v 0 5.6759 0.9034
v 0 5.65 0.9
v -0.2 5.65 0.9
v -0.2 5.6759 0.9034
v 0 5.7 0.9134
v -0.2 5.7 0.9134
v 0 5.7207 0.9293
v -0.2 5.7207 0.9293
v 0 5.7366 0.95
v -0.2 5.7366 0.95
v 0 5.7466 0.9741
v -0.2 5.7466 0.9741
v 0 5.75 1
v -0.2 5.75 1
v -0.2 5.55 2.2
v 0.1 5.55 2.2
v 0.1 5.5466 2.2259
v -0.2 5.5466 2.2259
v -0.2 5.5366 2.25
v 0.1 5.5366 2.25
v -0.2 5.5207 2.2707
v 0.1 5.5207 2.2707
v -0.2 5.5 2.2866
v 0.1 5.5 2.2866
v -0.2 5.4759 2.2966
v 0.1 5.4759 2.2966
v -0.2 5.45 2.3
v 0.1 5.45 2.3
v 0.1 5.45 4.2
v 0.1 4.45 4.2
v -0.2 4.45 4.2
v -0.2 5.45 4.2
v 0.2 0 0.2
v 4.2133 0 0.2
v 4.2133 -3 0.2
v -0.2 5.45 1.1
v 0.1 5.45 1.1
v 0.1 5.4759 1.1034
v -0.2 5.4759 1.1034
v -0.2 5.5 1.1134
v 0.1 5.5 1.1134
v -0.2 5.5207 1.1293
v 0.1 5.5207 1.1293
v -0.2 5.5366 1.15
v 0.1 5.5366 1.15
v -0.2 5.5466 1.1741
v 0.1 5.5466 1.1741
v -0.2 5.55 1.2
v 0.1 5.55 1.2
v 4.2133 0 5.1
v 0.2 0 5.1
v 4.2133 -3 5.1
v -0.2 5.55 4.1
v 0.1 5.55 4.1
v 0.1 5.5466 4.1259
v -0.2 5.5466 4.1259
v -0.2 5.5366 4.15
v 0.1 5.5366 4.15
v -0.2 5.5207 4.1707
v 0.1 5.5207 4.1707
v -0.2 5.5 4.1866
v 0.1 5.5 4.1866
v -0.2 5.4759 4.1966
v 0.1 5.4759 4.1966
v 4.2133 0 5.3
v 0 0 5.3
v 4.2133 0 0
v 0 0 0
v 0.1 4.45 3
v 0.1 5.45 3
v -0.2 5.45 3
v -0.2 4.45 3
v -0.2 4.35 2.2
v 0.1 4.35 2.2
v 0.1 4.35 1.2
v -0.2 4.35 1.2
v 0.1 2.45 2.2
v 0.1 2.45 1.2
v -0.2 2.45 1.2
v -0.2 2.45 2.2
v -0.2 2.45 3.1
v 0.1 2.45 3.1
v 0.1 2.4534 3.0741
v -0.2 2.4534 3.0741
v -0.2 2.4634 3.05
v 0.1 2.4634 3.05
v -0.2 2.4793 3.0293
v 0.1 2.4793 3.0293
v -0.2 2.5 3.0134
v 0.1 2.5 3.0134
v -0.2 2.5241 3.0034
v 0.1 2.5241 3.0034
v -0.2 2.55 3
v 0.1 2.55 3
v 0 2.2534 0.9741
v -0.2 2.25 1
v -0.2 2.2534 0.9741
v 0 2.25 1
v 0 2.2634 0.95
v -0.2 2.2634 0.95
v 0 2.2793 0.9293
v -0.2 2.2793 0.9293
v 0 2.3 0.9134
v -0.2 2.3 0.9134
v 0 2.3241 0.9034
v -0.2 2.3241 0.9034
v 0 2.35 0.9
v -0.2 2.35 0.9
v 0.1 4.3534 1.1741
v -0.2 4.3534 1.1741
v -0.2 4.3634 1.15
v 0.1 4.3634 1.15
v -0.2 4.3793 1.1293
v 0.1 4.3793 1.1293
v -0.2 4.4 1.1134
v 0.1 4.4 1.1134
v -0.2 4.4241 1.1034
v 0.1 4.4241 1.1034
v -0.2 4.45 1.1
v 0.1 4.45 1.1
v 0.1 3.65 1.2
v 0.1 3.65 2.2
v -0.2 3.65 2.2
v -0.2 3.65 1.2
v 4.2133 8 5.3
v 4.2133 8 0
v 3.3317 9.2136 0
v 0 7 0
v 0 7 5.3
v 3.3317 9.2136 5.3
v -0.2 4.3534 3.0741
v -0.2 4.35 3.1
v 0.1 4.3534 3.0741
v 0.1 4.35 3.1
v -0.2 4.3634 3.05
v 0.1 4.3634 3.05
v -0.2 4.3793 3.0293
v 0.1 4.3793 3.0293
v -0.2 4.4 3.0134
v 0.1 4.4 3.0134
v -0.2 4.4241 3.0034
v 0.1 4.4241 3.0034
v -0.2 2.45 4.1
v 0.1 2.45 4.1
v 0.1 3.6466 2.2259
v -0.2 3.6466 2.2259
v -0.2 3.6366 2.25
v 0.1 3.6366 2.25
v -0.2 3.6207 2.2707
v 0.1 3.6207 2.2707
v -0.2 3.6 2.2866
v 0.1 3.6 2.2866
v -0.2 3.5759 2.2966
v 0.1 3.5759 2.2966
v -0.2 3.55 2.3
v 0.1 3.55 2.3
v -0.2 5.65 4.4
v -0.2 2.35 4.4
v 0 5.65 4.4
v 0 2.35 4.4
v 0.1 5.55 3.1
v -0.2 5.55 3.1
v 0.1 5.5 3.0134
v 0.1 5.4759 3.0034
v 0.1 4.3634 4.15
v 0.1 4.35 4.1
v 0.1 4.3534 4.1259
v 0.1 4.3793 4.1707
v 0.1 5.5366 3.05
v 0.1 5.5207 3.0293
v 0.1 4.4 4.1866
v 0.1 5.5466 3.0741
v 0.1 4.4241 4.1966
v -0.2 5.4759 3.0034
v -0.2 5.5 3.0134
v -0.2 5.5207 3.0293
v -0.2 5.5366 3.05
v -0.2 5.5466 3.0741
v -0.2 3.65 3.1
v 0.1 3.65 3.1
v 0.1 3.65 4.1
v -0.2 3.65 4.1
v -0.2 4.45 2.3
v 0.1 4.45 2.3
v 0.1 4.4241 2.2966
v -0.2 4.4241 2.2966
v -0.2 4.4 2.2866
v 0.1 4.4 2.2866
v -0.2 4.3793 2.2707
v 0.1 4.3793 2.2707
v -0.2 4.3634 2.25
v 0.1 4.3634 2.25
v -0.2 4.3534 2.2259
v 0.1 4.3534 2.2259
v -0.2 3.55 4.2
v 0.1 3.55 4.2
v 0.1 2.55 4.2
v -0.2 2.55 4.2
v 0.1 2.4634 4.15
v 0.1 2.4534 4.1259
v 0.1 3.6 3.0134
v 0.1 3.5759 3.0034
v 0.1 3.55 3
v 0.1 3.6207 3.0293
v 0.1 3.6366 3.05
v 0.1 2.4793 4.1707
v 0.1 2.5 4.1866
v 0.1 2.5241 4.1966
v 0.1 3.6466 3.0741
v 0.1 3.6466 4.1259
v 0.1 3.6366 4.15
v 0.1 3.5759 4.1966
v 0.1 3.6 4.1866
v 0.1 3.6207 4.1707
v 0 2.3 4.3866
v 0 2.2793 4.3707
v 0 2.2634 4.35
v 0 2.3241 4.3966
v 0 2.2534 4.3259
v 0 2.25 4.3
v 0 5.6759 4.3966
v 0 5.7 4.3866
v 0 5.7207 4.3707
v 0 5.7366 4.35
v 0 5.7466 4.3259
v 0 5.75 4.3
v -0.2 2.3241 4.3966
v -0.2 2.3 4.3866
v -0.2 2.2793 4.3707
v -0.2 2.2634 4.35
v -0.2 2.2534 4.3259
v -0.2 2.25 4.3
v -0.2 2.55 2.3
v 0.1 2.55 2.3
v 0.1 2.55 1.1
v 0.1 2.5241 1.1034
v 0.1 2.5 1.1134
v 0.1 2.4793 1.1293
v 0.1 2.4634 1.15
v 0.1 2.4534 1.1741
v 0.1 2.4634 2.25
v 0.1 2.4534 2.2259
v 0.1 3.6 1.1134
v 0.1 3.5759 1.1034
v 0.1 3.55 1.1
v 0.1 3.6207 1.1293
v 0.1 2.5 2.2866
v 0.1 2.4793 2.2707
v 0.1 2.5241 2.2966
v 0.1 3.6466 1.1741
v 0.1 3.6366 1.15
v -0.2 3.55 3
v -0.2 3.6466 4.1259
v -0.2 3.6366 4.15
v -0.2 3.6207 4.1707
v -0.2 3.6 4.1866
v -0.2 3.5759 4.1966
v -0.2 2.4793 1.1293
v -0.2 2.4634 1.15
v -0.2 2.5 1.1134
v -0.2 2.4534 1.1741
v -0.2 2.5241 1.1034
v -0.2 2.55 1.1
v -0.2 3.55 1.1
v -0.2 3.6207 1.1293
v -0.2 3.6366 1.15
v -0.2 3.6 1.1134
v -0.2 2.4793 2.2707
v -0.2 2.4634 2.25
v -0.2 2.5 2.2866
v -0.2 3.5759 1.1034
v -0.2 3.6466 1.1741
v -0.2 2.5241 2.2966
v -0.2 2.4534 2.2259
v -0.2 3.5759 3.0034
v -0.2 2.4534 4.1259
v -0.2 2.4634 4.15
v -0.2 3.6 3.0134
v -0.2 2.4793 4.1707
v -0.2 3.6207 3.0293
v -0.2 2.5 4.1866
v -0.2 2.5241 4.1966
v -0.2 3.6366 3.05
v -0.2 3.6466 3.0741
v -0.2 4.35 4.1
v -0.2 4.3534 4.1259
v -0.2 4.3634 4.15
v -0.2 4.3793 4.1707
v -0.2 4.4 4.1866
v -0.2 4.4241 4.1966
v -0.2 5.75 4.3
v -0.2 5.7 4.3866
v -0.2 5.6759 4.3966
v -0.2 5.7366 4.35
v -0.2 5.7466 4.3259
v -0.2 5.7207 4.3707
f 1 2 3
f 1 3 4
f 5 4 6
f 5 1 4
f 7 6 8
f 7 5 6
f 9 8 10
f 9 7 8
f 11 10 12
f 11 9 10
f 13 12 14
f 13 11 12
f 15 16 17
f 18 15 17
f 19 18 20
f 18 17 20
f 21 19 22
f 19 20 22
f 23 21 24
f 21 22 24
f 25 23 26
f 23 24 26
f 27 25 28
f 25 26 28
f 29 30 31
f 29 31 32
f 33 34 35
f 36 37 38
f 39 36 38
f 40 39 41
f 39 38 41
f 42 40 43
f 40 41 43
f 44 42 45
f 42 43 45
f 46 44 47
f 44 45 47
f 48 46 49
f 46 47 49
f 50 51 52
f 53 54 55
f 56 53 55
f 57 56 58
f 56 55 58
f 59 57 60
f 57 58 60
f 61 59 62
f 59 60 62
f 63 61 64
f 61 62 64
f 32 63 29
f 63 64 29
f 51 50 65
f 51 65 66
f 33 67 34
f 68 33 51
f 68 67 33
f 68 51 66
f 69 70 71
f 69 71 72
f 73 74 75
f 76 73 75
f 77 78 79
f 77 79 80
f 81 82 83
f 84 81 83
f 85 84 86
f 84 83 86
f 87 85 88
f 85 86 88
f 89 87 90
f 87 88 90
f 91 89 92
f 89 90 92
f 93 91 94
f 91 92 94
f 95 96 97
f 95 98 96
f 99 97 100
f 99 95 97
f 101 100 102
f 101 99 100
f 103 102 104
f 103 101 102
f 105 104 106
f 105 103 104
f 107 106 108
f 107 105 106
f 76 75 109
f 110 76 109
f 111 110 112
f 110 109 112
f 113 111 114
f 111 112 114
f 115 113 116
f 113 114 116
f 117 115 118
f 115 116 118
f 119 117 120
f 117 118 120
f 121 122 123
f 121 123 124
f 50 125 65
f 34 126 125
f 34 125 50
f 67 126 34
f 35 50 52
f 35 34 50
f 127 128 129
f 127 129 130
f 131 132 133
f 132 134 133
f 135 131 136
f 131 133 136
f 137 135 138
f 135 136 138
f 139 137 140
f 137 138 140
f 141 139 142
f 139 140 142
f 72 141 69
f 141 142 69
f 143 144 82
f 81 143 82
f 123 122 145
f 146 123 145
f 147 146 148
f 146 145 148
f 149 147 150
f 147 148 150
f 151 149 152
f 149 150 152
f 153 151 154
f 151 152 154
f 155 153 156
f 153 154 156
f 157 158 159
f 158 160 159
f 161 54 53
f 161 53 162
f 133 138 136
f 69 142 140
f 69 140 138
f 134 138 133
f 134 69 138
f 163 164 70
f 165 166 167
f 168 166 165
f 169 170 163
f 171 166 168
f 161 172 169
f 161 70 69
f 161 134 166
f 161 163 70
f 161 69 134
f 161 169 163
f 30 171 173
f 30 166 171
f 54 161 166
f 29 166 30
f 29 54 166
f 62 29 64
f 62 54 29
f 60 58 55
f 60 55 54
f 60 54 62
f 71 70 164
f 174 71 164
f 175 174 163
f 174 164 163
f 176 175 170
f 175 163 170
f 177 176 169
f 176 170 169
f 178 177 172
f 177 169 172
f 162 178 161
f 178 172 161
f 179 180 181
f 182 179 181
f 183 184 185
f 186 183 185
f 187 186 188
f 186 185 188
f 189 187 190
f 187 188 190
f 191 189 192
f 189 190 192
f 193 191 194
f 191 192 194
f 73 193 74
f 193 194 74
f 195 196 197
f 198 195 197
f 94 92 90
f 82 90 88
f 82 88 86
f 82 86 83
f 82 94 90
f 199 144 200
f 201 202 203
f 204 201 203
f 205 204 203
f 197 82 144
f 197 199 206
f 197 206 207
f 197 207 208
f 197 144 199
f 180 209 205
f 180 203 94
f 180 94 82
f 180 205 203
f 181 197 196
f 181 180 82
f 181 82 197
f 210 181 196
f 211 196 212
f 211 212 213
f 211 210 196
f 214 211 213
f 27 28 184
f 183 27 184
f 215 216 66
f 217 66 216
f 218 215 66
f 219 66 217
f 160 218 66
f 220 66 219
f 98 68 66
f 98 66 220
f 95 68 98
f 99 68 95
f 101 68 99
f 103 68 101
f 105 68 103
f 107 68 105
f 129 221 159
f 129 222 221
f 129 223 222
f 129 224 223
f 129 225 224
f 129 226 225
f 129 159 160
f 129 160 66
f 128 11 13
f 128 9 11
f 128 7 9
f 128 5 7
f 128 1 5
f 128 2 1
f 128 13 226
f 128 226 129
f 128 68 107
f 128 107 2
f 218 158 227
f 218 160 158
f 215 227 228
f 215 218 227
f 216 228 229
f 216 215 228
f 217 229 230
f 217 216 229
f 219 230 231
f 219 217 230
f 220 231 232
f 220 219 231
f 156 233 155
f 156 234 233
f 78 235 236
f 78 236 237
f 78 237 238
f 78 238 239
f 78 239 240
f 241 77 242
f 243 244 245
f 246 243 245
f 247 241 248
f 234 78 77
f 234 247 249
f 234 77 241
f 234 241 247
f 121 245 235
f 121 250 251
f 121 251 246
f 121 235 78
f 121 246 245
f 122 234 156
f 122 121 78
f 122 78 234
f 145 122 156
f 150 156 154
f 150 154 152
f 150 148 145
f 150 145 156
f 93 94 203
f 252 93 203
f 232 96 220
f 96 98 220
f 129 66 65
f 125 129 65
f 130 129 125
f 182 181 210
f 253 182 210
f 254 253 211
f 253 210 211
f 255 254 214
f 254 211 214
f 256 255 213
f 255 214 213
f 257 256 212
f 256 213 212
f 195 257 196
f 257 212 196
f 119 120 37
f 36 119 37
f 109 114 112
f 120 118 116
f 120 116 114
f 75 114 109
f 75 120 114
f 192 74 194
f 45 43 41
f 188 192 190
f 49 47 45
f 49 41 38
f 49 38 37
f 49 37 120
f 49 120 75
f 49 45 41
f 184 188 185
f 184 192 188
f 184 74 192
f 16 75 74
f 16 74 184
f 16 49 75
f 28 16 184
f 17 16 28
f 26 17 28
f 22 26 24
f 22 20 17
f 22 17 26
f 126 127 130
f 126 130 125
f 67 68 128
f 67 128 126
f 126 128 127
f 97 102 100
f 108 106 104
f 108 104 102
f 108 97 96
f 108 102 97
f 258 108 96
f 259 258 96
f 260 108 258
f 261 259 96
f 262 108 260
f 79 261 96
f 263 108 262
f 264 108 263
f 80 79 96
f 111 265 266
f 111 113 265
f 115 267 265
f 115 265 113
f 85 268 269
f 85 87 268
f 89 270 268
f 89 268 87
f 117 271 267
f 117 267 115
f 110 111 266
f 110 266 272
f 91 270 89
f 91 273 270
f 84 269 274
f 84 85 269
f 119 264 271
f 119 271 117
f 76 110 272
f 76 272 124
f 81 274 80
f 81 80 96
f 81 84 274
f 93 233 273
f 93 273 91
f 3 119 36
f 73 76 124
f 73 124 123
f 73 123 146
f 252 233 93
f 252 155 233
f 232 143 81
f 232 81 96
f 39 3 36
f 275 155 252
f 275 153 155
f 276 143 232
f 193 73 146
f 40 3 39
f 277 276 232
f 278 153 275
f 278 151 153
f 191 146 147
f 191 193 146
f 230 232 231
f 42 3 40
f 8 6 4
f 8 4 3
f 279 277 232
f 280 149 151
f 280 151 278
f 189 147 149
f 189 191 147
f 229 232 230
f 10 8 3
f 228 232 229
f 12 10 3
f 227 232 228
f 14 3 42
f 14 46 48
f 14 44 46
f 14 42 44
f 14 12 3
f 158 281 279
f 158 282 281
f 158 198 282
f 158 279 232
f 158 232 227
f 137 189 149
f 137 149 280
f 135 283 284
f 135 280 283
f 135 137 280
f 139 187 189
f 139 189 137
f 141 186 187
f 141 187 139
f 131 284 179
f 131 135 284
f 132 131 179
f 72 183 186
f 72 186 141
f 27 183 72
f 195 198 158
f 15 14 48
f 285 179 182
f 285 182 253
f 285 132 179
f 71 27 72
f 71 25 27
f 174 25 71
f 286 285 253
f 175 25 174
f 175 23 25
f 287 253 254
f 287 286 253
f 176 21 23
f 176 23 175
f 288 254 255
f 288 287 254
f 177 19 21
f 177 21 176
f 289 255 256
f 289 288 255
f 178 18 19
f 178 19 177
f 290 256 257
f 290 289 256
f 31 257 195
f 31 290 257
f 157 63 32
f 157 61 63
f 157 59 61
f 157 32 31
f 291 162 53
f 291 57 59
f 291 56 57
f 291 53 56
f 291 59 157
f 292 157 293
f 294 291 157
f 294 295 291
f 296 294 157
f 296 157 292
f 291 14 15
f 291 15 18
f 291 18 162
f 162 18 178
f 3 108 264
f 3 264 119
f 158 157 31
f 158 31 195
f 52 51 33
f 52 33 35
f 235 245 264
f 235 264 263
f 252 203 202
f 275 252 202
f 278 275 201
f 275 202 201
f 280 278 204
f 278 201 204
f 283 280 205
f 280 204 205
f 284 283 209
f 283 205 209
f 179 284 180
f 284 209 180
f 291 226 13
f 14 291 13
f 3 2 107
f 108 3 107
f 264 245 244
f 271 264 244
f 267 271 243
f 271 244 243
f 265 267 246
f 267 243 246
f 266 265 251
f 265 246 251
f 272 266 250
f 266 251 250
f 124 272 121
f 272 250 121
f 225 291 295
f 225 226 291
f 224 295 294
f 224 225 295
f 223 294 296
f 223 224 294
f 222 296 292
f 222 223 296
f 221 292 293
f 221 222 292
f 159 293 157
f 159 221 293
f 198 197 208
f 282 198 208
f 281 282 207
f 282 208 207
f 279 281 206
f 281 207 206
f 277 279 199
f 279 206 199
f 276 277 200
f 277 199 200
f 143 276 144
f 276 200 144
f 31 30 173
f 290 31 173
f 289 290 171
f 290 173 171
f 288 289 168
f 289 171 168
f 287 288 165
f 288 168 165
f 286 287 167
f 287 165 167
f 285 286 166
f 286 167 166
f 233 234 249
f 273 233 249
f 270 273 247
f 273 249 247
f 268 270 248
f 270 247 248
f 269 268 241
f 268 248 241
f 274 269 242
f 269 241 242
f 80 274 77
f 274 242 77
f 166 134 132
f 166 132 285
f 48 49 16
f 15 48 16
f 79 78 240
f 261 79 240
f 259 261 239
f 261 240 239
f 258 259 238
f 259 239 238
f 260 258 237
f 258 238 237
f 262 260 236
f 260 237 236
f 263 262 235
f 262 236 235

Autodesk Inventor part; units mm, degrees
ref_plane "YZ Plane" through (0, 0, 0) normal (1, 0, 0) x (0, 1, 0)
ref_plane "XZ Plane" through (0, 0, 0) normal (0, 1, 0) x (-1, 0, 0)
ref_plane "XY Plane" through (0, 0, 0) normal (0, 0, 1) x (1, 0, 0)
sketch "草圖1" plane through (0, 0, 0) normal (0, 0, 1) x (1, 0, 0)
  line L0 (0, 0) -> (0, 7)
  line L1 (0, 7) -> (3.3317, 9.2136)
  line L2 (3.3317, 9.2136) -> (4.2133, 8)
  line L3 (4.2133, 8) -> (4.2133, 0)
  line L4 (4.2133, 0) -> (0, 0)
  dimension "d0" = 7
  dimension "d1" = 4
  dimension "d2" = 1.5
  dimension "d3" = 8
extrude "擠出1" add sketch "草圖1" along normal blind 5.3
sketch "草圖2" plane through (0, 0, 0) normal (-1, 0, 0) x (0, 0, 1)
  line L0 (1, 2.25) -> (4.3, 2.25)
  line L1 (4.4, 2.35) -> (4.4, 5.65)
  line L2 (4.3, 5.75) -> (1, 5.75)
  line L3 (0.9, 5.65) -> (0.9, 2.35)
  line L4 (0.9, 2.25) -> (4.4, 5.75) construction
  line L5 (4.4, 2.25) -> (0.9, 5.75) construction
  line L6 (1.2, 5.55) -> (2.2, 5.55)
  line L7 (2.3, 5.45) -> (2.3, 4.45)
  line L8 (2.2, 4.35) -> (1.2, 4.35)
  line L9 (1.1, 4.45) -> (1.1, 5.45)
  line L10 (1.1, 5.55) -> (2.3, 4.35) construction
  line L11 (2.3, 5.55) -> (1.1, 4.35) construction
  line L12 (3.1, 4.35) -> (4.1, 4.35)
  line L13 (4.2, 4.45) -> (4.2, 5.45)
  line L14 (4.1, 5.55) -> (3.1, 5.55)
  line L15 (3, 5.45) -> (3, 4.45)
  line L16 (3, 4.35) -> (4.2, 5.55) construction
  line L17 (4.2, 4.35) -> (3, 5.55) construction
  line L18 (3.1, 3.65) -> (4.1, 3.65)
  line L19 (4.2, 3.55) -> (4.2, 2.55)
  line L20 (4.1, 2.45) -> (3.1, 2.45)
  line L21 (3, 2.55) -> (3, 3.55)
  line L22 (3, 3.65) -> (4.2, 2.45) construction
  line L23 (4.2, 3.65) -> (3, 2.45) construction
  line L24 (1.2, 2.45) -> (2.2, 2.45)
  line L25 (2.3, 2.55) -> (2.3, 3.55)
  line L26 (2.2, 3.65) -> (1.2, 3.65)
  line L27 (1.1, 3.55) -> (1.1, 2.55)
  line L28 (1.1, 2.45) -> (2.3, 3.65) construction
  line L29 (2.3, 2.45) -> (1.1, 3.65) construction
  arc A0 (1, 5.75) -> (0.9, 5.65) centre (1, 5.65) ccw
  arc A1 (0.9, 2.35) -> (1, 2.25) centre (1, 2.35) ccw
  arc A2 (4.3, 2.25) -> (4.4, 2.35) centre (4.3, 2.35) ccw
  arc A3 (4.4, 5.65) -> (4.3, 5.75) centre (4.3, 5.65) ccw
  arc A4 (4.2, 5.45) -> (4.1, 5.55) centre (4.1, 5.45) ccw
  arc A5 (4.1, 4.35) -> (4.2, 4.45) centre (4.1, 4.45) ccw
  arc A6 (3, 4.45) -> (3.1, 4.35) centre (3.1, 4.45) ccw
  arc A7 (3.1, 5.55) -> (3, 5.45) centre (3.1, 5.45) ccw
  arc A8 (2.3, 5.45) -> (2.2, 5.55) centre (2.2, 5.45) ccw
  arc A9 (1.2, 5.55) -> (1.1, 5.45) centre (1.2, 5.45) ccw
  arc A10 (1.1, 4.45) -> (1.2, 4.35) centre (1.2, 4.45) ccw
  arc A11 (2.2, 4.35) -> (2.3, 4.45) centre (2.2, 4.45) ccw
  arc A12 (2.3, 3.55) -> (2.2, 3.65) centre (2.2, 3.55) ccw
  arc A13 (2.2, 2.45) -> (2.3, 2.55) centre (2.2, 2.55) ccw
  arc A14 (1.1, 2.55) -> (1.2, 2.45) centre (1.2, 2.55) ccw
  arc A15 (1.2, 3.65) -> (1.1, 3.55) centre (1.2, 3.55) ccw
  arc A16 (3.1, 3.65) -> (3, 3.55) centre (3.1, 3.55) ccw
  arc A17 (4.2, 3.55) -> (4.1, 3.65) centre (4.1, 3.55) ccw
  arc A18 (4.1, 2.45) -> (4.2, 2.55) centre (4.1, 2.55) ccw
  arc A19 (3, 2.55) -> (3.1, 2.45) centre (3.1, 2.55) ccw
  point P0 (2.65, 4)
  point P1 (1.7, 4.95)
  point P2 (3.6, 4.95)
  point P3 (3.6, 3.05)
  point P4 (1.7, 3.05)
  dimension "d7" = 3.5
  dimension "d8" = 3.5
  dimension "d9" = 1.2
  dimension "d10" = 1.2
  dimension "d11" = 0.2
  dimension "d12" = 0.1
  dimension "d13" = 0.1
extrude "擠出2" add sketch "草圖2" along normal blind 0.2
extrude "擠出3" cut sketch "草圖2" against normal blind 0.1 contours L6 A8 L7 A11 L8 A10 L9 A9 | A6 L15 A7 L14 A4 L13 A5 L12 | L18 A17 L19 A18 L20 A19 L21 A16 | A14 L27 A15 L26 A12 L25 A13 L24
sketch "草圖3" plane through (0, 0, 0) normal (0, -1, 0) x (1, 0, 0)
  line L0 (4.2133, 0) -> (4.2133, 5.3) projected
  line L1 (4.2133, 0.2) -> (0.2, 0.2)
  line L2 (0.2, 0.2) -> (0.2, 5.1)
  line L3 (0.2, 5.1) -> (4.2133, 5.1)
  line L4 (4.2133, 5.1) -> (4.2133, 0.2)
  line L5 (0, 0) -> (4.2133, 0) projected
  line L6 (0, 0) -> (0, 5.3) projected
  line L7 (0, 5.3) -> (4.2133, 5.3) projected
  dimension "d18" = 0.2
  dimension "d19" = 0.2
  dimension "d20" = 0.2
extrude "擠出4" add sketch "草圖3" along normal blind 3 contours L1 L2 L3 L0
sketch "草圖4" plane through (0.2, 0, 5.1) normal (0, 0, 1) x (1, 0, 0)
  line L0 (4.0133, 0) -> (0, 0) projected
  line L1 (0, 0) -> (4.0133, -3)
  line L2 (0, -3) -> (4.0133, -3) projected
  line L3 (4.0133, -3) -> (0, -3)
  line L4 (0, -3) -> (0, 0)
  point P0 (-0.2, 0)
extrude "擠出5" cut sketch "草圖4" against normal up to surface (4.9 mm away)
properties part number "頭 小小屋"
